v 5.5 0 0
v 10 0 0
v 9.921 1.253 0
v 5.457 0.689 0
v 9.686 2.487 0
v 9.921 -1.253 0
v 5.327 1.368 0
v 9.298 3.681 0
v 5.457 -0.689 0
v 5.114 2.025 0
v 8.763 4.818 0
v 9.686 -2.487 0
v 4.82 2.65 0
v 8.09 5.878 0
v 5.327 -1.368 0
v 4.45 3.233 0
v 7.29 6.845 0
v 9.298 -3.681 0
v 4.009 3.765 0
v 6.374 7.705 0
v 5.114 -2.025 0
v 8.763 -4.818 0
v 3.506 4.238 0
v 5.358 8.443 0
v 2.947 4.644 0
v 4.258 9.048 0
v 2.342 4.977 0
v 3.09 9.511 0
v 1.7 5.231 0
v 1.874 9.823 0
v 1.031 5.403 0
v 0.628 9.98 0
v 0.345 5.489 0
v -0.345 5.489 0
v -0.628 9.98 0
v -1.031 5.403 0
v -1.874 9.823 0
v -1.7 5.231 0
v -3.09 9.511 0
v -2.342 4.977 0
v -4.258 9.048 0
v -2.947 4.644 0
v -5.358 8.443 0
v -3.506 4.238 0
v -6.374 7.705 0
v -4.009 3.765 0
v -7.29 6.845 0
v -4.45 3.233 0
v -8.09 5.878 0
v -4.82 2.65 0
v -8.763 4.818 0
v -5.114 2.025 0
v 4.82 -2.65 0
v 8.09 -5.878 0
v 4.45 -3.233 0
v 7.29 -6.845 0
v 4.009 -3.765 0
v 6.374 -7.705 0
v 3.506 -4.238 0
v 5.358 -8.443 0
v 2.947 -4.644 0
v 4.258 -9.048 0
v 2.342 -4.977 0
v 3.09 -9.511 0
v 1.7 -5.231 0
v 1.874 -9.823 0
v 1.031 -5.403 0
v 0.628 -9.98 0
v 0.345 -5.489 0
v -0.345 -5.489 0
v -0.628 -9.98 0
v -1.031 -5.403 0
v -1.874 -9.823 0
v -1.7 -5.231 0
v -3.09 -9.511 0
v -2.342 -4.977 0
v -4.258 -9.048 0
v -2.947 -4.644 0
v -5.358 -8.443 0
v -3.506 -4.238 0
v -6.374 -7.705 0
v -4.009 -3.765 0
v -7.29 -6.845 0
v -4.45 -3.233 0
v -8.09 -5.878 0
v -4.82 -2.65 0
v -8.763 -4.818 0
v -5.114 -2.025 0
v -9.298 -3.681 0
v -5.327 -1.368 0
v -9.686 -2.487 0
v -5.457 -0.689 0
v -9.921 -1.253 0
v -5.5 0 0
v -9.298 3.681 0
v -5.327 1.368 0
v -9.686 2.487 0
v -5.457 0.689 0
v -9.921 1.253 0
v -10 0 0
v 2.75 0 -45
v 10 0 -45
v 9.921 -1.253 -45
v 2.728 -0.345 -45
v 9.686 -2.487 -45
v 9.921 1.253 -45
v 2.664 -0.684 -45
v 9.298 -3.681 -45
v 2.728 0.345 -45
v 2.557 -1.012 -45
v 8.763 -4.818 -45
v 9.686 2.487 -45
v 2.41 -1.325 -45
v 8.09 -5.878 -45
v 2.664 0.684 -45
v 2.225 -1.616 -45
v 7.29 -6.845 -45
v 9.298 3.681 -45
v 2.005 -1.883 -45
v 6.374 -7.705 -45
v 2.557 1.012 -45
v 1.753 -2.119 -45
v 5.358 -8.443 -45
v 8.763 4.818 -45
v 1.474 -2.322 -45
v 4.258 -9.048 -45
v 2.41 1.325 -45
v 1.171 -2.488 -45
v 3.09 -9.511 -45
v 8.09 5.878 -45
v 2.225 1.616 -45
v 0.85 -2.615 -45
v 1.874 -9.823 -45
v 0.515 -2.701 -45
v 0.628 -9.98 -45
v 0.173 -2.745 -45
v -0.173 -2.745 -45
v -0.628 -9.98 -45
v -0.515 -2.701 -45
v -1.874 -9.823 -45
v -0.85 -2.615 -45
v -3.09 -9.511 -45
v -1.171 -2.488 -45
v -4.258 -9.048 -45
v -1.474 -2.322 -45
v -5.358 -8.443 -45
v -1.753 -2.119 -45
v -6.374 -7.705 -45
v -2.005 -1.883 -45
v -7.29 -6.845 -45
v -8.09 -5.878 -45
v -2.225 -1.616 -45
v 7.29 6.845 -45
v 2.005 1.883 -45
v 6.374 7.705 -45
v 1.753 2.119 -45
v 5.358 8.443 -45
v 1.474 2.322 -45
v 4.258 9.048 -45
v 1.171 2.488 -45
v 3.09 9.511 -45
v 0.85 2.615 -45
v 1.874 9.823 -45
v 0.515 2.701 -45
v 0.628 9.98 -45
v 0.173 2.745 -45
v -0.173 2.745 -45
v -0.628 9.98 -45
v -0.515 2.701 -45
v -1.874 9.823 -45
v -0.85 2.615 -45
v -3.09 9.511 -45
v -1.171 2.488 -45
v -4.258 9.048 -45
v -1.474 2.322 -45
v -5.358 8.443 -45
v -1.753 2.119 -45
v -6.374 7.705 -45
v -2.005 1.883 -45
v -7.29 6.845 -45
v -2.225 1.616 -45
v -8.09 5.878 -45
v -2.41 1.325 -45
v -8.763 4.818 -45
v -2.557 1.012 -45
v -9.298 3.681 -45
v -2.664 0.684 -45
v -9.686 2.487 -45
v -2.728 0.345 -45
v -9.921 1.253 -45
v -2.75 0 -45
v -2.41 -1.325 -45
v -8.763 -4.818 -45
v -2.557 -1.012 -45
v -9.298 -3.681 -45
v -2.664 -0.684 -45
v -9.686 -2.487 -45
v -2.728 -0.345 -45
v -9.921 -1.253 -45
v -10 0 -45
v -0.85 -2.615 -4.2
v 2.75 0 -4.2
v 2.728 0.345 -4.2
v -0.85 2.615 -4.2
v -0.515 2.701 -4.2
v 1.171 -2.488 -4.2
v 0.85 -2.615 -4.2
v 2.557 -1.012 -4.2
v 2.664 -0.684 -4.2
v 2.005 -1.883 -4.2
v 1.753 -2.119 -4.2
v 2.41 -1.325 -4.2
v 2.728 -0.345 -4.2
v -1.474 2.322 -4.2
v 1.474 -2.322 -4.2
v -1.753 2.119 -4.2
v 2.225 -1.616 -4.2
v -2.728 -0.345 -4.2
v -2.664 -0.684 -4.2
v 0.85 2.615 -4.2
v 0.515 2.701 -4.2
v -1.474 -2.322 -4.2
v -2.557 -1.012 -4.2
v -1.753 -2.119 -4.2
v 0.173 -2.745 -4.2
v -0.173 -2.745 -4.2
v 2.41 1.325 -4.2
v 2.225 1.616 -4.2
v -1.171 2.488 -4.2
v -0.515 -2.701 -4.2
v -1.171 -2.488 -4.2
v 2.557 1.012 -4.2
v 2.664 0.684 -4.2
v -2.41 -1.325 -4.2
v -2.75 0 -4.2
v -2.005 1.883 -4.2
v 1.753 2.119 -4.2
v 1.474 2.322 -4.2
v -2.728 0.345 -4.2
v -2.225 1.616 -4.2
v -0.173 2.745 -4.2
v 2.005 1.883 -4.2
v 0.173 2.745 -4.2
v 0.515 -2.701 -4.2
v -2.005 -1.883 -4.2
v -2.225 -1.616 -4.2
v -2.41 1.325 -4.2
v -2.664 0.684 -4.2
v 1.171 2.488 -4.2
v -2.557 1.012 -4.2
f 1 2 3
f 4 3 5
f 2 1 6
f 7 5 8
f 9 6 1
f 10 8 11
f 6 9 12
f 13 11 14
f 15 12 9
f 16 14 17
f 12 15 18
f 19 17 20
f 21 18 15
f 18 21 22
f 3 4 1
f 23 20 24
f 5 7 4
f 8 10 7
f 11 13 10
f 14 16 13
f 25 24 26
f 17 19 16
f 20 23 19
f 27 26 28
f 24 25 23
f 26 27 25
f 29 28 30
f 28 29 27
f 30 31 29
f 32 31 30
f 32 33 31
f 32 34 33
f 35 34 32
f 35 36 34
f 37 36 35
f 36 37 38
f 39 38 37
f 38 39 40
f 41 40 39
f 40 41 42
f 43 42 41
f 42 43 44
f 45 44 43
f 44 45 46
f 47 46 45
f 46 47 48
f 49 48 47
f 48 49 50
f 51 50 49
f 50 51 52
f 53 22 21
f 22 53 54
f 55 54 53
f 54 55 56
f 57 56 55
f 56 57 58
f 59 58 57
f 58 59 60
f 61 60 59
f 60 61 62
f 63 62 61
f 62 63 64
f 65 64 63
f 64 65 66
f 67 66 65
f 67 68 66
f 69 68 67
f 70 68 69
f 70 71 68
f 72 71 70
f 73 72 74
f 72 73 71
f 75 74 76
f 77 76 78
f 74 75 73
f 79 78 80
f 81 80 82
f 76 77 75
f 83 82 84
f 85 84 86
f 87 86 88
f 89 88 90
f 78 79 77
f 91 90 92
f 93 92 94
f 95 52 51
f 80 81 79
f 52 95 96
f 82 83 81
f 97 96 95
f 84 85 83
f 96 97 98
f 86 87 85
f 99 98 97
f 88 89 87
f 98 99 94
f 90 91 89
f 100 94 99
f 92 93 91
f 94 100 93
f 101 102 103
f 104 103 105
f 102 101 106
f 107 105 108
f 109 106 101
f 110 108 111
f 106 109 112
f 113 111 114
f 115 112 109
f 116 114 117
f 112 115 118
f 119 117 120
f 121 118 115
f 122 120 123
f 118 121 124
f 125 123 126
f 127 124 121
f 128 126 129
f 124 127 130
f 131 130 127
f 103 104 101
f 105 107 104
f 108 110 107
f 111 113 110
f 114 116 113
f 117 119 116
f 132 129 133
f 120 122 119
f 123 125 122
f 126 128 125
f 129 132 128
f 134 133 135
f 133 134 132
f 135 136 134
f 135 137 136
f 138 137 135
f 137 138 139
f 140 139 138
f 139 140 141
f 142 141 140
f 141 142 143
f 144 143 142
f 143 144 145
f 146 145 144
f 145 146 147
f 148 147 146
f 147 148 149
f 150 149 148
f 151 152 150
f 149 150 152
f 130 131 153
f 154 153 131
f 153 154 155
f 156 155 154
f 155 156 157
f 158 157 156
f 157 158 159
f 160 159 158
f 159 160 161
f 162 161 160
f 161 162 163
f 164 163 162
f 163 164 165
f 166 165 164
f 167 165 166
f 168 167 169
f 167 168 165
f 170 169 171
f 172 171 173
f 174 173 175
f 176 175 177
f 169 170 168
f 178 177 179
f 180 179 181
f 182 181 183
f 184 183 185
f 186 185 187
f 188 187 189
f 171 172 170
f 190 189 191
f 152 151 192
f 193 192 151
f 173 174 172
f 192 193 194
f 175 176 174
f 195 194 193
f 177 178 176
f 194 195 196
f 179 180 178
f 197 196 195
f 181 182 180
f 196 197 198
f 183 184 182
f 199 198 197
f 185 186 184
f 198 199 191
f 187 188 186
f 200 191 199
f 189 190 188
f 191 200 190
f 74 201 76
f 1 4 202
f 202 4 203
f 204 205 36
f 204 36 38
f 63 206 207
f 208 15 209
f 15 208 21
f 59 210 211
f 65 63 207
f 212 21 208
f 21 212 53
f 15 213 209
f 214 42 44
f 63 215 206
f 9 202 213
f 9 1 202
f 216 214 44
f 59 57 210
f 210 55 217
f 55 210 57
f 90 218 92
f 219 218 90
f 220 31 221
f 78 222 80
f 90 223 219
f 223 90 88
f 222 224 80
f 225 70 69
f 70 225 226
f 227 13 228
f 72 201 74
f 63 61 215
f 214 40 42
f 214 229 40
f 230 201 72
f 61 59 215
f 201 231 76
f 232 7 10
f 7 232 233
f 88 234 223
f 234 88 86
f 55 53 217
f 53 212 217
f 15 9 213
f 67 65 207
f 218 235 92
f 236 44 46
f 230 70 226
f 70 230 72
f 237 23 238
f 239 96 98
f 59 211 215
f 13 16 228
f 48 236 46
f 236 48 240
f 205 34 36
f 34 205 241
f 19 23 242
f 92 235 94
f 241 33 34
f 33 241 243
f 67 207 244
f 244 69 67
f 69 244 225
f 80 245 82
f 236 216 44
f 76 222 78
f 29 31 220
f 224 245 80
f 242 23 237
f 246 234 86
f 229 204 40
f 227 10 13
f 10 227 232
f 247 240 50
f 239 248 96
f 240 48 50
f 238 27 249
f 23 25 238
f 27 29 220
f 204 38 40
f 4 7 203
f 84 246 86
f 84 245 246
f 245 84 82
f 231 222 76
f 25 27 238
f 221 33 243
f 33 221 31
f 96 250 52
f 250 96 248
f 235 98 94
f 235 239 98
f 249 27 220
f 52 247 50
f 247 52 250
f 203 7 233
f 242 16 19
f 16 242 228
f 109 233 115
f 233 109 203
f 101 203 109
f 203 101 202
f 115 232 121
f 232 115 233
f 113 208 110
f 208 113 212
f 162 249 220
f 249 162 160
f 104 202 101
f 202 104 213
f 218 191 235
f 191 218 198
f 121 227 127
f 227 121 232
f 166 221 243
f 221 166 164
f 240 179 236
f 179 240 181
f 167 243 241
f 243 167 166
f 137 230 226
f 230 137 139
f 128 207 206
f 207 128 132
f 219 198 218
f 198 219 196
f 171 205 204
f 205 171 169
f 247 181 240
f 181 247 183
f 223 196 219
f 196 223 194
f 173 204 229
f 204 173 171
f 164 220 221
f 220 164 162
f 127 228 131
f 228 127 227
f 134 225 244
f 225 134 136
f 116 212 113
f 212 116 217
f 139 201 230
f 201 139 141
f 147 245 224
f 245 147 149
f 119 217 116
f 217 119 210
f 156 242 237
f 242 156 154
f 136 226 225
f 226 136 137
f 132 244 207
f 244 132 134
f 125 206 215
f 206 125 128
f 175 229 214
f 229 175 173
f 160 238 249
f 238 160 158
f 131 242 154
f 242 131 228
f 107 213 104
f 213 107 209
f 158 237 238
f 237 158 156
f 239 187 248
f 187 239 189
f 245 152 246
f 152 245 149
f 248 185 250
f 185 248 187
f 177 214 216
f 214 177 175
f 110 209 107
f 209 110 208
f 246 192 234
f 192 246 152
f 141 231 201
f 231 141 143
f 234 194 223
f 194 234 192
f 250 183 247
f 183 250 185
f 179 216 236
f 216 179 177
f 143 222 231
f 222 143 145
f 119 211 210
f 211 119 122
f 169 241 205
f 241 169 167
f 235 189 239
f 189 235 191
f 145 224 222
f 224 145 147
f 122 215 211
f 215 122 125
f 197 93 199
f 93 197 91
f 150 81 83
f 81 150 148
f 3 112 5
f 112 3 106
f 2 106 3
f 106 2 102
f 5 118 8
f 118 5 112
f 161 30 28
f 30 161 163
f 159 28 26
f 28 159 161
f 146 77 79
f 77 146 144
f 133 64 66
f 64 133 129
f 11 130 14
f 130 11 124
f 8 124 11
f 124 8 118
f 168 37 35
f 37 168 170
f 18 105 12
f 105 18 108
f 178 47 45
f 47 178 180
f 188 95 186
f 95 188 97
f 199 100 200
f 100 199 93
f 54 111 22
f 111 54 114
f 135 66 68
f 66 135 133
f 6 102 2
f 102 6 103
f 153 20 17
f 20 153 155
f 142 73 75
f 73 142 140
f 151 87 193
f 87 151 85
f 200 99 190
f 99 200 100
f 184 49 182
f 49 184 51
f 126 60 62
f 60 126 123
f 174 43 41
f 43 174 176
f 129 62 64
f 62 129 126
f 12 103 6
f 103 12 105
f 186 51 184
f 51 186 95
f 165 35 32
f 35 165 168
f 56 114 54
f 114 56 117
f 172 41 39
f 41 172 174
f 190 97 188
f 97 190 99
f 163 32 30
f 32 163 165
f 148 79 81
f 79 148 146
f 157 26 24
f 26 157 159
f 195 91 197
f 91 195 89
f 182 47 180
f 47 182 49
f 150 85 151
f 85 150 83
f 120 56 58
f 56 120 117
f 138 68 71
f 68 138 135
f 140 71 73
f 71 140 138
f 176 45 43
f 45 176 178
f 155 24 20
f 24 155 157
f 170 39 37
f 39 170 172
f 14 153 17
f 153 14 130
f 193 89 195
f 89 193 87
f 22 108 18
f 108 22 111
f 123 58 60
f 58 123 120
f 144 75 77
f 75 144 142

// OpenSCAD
$fn = 50;


difference() {
	union() {
		translate(v = [0, 0, -45.0000000000]) {
			cylinder(h = 45, r = 10.0000000000);
		}
		cylinder(h = 0, r = 13.0000000000);
	}
	union() {
		translate(v = [0, 0, 0]) {
			rotate(a = [0, 0, 0]) {
				difference() {
					union() {
						#translate(v = [0, 0, -45.0000000000]) {
							cylinder(h = 45, r = 2.2500000000);
						}
						#translate(v = [0, 0, -4.2000000000]) {
							cylinder(h = 4.2000000000, r1 = 2.7500000000, r2 = 5.5000000000);
						}
						#translate(v = [0, 0, -45.0000000000]) {
							cylinder(h = 45, r = 2.7500000000);
						}
						#translate(v = [0, 0, -45.0000000000]) {
							cylinder(h = 45, r = 2.2500000000);
						}
					}
					union();
				}
			}
		}
	}
}
